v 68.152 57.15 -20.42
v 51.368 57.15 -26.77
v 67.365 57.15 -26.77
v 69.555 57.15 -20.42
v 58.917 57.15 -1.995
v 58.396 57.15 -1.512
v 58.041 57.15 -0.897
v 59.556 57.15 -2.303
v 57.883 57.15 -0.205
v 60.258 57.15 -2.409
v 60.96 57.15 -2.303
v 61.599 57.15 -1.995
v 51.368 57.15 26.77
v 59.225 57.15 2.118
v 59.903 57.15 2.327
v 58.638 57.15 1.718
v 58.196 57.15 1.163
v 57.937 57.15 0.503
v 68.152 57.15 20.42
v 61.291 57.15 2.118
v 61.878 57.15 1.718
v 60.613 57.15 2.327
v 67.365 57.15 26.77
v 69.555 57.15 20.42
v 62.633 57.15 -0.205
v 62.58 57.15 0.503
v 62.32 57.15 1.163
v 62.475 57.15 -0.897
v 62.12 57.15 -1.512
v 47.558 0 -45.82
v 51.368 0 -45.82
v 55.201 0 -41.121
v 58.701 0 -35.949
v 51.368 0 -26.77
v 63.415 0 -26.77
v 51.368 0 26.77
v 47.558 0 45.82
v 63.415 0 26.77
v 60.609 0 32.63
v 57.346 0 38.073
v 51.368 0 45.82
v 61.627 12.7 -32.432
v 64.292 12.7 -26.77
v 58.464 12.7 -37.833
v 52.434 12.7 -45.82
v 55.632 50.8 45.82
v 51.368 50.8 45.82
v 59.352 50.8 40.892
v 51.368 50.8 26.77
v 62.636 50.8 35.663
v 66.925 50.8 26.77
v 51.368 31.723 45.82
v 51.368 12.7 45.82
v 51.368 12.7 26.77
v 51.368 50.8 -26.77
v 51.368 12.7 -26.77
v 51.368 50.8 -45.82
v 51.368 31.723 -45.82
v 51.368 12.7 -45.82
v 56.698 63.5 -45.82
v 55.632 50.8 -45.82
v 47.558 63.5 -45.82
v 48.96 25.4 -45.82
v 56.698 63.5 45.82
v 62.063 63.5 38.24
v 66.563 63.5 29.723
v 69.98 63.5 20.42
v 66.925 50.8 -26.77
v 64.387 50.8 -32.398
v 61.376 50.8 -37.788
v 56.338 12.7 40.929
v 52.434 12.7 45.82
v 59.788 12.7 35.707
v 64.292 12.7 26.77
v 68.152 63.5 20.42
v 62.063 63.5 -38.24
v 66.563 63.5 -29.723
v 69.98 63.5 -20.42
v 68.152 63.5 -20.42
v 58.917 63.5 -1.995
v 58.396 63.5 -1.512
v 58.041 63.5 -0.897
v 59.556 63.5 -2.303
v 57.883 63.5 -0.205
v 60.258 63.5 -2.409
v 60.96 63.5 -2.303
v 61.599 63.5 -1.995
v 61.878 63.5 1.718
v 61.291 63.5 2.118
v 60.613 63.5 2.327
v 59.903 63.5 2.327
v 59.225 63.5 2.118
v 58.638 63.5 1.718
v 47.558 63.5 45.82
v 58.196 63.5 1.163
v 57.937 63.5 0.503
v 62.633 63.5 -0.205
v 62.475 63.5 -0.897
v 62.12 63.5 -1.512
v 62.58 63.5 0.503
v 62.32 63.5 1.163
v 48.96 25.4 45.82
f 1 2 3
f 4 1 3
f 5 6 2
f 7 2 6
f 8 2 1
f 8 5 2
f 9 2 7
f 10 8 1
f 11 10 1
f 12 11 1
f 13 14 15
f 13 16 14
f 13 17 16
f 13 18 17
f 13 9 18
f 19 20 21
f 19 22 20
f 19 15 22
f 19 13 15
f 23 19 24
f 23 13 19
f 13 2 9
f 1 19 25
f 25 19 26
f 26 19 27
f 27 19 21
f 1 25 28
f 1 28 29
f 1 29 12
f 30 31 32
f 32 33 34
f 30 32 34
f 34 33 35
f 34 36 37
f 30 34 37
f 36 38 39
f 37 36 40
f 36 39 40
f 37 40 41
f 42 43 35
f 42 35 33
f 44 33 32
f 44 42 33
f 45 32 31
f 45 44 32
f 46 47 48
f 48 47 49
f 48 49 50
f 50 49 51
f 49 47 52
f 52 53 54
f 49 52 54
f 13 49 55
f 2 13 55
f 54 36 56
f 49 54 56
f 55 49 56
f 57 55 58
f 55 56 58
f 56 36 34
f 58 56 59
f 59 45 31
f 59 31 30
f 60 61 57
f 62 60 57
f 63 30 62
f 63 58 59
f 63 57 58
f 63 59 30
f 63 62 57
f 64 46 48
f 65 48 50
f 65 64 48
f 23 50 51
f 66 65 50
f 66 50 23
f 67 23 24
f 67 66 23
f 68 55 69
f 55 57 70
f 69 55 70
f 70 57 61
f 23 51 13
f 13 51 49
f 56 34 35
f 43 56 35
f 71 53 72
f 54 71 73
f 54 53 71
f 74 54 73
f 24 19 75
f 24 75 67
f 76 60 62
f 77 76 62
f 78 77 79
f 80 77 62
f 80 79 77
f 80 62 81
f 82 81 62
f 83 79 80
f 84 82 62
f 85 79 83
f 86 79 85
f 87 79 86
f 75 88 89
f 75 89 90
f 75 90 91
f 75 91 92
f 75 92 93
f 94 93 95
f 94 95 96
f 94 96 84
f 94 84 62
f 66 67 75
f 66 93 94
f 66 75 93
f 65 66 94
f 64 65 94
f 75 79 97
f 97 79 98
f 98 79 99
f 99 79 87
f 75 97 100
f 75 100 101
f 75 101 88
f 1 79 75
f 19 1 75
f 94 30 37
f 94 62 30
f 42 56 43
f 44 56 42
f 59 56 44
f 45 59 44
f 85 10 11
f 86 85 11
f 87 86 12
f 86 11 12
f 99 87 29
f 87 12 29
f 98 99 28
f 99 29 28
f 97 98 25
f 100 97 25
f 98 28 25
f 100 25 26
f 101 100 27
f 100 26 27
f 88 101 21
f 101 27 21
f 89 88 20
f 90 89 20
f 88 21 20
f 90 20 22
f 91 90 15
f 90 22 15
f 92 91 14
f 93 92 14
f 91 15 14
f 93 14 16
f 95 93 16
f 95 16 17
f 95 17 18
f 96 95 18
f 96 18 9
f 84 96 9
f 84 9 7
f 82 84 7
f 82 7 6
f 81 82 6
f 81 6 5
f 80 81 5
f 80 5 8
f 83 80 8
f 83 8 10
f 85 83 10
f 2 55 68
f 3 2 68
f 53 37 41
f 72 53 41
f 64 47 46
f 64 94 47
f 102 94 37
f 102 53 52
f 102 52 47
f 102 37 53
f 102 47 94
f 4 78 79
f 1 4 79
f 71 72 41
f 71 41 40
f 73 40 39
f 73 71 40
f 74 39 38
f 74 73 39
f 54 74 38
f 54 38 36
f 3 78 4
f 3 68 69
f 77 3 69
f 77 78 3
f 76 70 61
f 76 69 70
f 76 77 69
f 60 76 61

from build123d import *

# Parameters (mm, degrees)
CUT_EXTRUDE1_DEPTH      = 57.15
CUT_EXTRUDE2_DEPTH      = 57.15
CUT_EXTRUDE3_DEPTH      = 106.018320578
CUT_EXTRUDE3_DEPTH_BACK = 106.018320578
SKETCH7_W               = 43.8822002
SKETCH7_H               = 38.1
SKETCH8_R               = 2.38125
CUT_EXTRUDE4_DEPTH      = 57.15


with BuildPart() as part:
    # Sketch1 for Loft1 → Loft1 section 0
    with BuildSketch(Plane(origin=(0, 0, 0), x_dir=(1, 0, 0), z_dir=(0, 1, 0))):
        with BuildLine():
            Line((47.55805847, 45.81966963), (47.55805847, -45.81966963))
            Line((47.55805847, -45.81966963), (51.36805847, -45.81966963))
            # circular arc as an exact rational Bezier (weights 1, cos(half-angle), 1)
            Bezier((51.36805847, -45.81966963), (92.238634224, 0), (51.36805847, 45.81966963), weights=[1, 0.746259966, 1])
            Line((51.36805847, 45.81966963), (47.55805847, 45.81966963))
        make_face()
    # Sketch2 for Loft1 → Loft1 section 1
    with BuildSketch(Plane(origin=(0, 63.5, 0), x_dir=(1, 0, 0), z_dir=(0, 1, 0))):
        with BuildLine():
            Line((47.55805847, 45.81966963), (47.55805847, -45.81966963))
            Line((47.55805847, -45.81966963), (56.698115303, -45.81966963))
            Bezier((56.698115303, -45.81966963), (93.726544094, 0), (56.698115303, 45.81966963), weights=[1, 0.777773263, 1])
            Line((56.698115303, 45.81966963), (47.55805847, 45.81966963))
        make_face()
    loft()

    # Sketch5 → Cut-Extrude1 (cut)
    with BuildSketch(Plane.XZ):
        with BuildLine():
            ThreePointArc((63.415332088, -26.76966963), (68.834, 0), (63.415332088, 26.76966963))
            Line((63.415332088, 26.76966963), (51.36805847, 26.76966963))
            Line((51.36805847, 26.76966963), (51.36805847, -26.76966963))
            Line((51.36805847, -26.76966963), (63.415332088, -26.76966963))
        make_face()
        with BuildLine():
            Line((102.991666241, 26.76966963), (63.415332088, 26.76966963))
            ThreePointArc((63.415332088, 26.76966963), (68.834, 0), (63.415332088, -26.76966963))
            Line((63.415332088, -26.76966963), (102.991666241, -26.76966963))
            Line((102.991666241, -26.76966963), (102.991666241, 26.76966963))
        make_face()
    extrude(amount=-CUT_EXTRUDE1_DEPTH, mode=Mode.SUBTRACT)

    # Sketch6 → Cut-Extrude2 (cut)
    with BuildSketch(Plane(origin=(0, 63.5, 0), x_dir=(1, 0, 0), z_dir=(0, 1, 0))):
        with BuildLine():
            Line((103.737826736, 20.41966963), (69.979679166, 20.41966963))
            add(Edge.make_bspline(
                [(69.979679166, -20.419669631), (75.938021828, 0), (69.979679166, 20.419669631)],
                knots=[0.297886949, 0.297886949, 0.297886949, 0.702113051, 0.702113051, 0.702113051], degree=2, weights=[0.907042416, 0.870730847, 0.907042416]))
            Line((69.979679166, -20.41966963), (103.737826736, -20.41966963))
            Line((103.737826736, -20.41966963), (103.737826736, 20.41966963))
        make_face()
        with BuildLine():
            add(Edge.make_bspline(
                [(69.979679166, -20.419669631), (75.938021828, 0), (69.979679166, 20.419669631)],
                knots=[0.297886949, 0.297886949, 0.297886949, 0.702113051, 0.702113051, 0.702113051], degree=2, weights=[0.907042416, 0.870730847, 0.907042416]))
            Line((69.979679166, 20.41966963), (68.152482199, 20.41966963))
            Line((68.152482199, 20.41966963), (68.152482199, -20.41966963))
            Line((68.152482199, -20.41966963), (69.979679166, -20.41966963))
        make_face()
    extrude(amount=-CUT_EXTRUDE2_DEPTH, mode=Mode.SUBTRACT)

    # Sketch7 → Cut-Extrude3 (cut, two sides: drawn at the far end of the back side and taken through both)
    with BuildSketch(Plane.XY.offset(-CUT_EXTRUDE3_DEPTH_BACK)):
        with Locations((73.30915857, 31.75)):
            Rectangle(SKETCH7_W, SKETCH7_H)
    extrude(amount=CUT_EXTRUDE3_DEPTH + CUT_EXTRUDE3_DEPTH_BACK, mode=Mode.SUBTRACT)

    # Sketch8 → Cut-Extrude4 (cut)
    with BuildSketch(Plane.XZ.offset(-57.15)):
        with Locations(Location((60.25805847, -0.02733037, 0), (0, 0, 270))):
            Circle(SKETCH8_R)
    extrude(amount=-CUT_EXTRUDE4_DEPTH, mode=Mode.SUBTRACT)


solid = part.part
